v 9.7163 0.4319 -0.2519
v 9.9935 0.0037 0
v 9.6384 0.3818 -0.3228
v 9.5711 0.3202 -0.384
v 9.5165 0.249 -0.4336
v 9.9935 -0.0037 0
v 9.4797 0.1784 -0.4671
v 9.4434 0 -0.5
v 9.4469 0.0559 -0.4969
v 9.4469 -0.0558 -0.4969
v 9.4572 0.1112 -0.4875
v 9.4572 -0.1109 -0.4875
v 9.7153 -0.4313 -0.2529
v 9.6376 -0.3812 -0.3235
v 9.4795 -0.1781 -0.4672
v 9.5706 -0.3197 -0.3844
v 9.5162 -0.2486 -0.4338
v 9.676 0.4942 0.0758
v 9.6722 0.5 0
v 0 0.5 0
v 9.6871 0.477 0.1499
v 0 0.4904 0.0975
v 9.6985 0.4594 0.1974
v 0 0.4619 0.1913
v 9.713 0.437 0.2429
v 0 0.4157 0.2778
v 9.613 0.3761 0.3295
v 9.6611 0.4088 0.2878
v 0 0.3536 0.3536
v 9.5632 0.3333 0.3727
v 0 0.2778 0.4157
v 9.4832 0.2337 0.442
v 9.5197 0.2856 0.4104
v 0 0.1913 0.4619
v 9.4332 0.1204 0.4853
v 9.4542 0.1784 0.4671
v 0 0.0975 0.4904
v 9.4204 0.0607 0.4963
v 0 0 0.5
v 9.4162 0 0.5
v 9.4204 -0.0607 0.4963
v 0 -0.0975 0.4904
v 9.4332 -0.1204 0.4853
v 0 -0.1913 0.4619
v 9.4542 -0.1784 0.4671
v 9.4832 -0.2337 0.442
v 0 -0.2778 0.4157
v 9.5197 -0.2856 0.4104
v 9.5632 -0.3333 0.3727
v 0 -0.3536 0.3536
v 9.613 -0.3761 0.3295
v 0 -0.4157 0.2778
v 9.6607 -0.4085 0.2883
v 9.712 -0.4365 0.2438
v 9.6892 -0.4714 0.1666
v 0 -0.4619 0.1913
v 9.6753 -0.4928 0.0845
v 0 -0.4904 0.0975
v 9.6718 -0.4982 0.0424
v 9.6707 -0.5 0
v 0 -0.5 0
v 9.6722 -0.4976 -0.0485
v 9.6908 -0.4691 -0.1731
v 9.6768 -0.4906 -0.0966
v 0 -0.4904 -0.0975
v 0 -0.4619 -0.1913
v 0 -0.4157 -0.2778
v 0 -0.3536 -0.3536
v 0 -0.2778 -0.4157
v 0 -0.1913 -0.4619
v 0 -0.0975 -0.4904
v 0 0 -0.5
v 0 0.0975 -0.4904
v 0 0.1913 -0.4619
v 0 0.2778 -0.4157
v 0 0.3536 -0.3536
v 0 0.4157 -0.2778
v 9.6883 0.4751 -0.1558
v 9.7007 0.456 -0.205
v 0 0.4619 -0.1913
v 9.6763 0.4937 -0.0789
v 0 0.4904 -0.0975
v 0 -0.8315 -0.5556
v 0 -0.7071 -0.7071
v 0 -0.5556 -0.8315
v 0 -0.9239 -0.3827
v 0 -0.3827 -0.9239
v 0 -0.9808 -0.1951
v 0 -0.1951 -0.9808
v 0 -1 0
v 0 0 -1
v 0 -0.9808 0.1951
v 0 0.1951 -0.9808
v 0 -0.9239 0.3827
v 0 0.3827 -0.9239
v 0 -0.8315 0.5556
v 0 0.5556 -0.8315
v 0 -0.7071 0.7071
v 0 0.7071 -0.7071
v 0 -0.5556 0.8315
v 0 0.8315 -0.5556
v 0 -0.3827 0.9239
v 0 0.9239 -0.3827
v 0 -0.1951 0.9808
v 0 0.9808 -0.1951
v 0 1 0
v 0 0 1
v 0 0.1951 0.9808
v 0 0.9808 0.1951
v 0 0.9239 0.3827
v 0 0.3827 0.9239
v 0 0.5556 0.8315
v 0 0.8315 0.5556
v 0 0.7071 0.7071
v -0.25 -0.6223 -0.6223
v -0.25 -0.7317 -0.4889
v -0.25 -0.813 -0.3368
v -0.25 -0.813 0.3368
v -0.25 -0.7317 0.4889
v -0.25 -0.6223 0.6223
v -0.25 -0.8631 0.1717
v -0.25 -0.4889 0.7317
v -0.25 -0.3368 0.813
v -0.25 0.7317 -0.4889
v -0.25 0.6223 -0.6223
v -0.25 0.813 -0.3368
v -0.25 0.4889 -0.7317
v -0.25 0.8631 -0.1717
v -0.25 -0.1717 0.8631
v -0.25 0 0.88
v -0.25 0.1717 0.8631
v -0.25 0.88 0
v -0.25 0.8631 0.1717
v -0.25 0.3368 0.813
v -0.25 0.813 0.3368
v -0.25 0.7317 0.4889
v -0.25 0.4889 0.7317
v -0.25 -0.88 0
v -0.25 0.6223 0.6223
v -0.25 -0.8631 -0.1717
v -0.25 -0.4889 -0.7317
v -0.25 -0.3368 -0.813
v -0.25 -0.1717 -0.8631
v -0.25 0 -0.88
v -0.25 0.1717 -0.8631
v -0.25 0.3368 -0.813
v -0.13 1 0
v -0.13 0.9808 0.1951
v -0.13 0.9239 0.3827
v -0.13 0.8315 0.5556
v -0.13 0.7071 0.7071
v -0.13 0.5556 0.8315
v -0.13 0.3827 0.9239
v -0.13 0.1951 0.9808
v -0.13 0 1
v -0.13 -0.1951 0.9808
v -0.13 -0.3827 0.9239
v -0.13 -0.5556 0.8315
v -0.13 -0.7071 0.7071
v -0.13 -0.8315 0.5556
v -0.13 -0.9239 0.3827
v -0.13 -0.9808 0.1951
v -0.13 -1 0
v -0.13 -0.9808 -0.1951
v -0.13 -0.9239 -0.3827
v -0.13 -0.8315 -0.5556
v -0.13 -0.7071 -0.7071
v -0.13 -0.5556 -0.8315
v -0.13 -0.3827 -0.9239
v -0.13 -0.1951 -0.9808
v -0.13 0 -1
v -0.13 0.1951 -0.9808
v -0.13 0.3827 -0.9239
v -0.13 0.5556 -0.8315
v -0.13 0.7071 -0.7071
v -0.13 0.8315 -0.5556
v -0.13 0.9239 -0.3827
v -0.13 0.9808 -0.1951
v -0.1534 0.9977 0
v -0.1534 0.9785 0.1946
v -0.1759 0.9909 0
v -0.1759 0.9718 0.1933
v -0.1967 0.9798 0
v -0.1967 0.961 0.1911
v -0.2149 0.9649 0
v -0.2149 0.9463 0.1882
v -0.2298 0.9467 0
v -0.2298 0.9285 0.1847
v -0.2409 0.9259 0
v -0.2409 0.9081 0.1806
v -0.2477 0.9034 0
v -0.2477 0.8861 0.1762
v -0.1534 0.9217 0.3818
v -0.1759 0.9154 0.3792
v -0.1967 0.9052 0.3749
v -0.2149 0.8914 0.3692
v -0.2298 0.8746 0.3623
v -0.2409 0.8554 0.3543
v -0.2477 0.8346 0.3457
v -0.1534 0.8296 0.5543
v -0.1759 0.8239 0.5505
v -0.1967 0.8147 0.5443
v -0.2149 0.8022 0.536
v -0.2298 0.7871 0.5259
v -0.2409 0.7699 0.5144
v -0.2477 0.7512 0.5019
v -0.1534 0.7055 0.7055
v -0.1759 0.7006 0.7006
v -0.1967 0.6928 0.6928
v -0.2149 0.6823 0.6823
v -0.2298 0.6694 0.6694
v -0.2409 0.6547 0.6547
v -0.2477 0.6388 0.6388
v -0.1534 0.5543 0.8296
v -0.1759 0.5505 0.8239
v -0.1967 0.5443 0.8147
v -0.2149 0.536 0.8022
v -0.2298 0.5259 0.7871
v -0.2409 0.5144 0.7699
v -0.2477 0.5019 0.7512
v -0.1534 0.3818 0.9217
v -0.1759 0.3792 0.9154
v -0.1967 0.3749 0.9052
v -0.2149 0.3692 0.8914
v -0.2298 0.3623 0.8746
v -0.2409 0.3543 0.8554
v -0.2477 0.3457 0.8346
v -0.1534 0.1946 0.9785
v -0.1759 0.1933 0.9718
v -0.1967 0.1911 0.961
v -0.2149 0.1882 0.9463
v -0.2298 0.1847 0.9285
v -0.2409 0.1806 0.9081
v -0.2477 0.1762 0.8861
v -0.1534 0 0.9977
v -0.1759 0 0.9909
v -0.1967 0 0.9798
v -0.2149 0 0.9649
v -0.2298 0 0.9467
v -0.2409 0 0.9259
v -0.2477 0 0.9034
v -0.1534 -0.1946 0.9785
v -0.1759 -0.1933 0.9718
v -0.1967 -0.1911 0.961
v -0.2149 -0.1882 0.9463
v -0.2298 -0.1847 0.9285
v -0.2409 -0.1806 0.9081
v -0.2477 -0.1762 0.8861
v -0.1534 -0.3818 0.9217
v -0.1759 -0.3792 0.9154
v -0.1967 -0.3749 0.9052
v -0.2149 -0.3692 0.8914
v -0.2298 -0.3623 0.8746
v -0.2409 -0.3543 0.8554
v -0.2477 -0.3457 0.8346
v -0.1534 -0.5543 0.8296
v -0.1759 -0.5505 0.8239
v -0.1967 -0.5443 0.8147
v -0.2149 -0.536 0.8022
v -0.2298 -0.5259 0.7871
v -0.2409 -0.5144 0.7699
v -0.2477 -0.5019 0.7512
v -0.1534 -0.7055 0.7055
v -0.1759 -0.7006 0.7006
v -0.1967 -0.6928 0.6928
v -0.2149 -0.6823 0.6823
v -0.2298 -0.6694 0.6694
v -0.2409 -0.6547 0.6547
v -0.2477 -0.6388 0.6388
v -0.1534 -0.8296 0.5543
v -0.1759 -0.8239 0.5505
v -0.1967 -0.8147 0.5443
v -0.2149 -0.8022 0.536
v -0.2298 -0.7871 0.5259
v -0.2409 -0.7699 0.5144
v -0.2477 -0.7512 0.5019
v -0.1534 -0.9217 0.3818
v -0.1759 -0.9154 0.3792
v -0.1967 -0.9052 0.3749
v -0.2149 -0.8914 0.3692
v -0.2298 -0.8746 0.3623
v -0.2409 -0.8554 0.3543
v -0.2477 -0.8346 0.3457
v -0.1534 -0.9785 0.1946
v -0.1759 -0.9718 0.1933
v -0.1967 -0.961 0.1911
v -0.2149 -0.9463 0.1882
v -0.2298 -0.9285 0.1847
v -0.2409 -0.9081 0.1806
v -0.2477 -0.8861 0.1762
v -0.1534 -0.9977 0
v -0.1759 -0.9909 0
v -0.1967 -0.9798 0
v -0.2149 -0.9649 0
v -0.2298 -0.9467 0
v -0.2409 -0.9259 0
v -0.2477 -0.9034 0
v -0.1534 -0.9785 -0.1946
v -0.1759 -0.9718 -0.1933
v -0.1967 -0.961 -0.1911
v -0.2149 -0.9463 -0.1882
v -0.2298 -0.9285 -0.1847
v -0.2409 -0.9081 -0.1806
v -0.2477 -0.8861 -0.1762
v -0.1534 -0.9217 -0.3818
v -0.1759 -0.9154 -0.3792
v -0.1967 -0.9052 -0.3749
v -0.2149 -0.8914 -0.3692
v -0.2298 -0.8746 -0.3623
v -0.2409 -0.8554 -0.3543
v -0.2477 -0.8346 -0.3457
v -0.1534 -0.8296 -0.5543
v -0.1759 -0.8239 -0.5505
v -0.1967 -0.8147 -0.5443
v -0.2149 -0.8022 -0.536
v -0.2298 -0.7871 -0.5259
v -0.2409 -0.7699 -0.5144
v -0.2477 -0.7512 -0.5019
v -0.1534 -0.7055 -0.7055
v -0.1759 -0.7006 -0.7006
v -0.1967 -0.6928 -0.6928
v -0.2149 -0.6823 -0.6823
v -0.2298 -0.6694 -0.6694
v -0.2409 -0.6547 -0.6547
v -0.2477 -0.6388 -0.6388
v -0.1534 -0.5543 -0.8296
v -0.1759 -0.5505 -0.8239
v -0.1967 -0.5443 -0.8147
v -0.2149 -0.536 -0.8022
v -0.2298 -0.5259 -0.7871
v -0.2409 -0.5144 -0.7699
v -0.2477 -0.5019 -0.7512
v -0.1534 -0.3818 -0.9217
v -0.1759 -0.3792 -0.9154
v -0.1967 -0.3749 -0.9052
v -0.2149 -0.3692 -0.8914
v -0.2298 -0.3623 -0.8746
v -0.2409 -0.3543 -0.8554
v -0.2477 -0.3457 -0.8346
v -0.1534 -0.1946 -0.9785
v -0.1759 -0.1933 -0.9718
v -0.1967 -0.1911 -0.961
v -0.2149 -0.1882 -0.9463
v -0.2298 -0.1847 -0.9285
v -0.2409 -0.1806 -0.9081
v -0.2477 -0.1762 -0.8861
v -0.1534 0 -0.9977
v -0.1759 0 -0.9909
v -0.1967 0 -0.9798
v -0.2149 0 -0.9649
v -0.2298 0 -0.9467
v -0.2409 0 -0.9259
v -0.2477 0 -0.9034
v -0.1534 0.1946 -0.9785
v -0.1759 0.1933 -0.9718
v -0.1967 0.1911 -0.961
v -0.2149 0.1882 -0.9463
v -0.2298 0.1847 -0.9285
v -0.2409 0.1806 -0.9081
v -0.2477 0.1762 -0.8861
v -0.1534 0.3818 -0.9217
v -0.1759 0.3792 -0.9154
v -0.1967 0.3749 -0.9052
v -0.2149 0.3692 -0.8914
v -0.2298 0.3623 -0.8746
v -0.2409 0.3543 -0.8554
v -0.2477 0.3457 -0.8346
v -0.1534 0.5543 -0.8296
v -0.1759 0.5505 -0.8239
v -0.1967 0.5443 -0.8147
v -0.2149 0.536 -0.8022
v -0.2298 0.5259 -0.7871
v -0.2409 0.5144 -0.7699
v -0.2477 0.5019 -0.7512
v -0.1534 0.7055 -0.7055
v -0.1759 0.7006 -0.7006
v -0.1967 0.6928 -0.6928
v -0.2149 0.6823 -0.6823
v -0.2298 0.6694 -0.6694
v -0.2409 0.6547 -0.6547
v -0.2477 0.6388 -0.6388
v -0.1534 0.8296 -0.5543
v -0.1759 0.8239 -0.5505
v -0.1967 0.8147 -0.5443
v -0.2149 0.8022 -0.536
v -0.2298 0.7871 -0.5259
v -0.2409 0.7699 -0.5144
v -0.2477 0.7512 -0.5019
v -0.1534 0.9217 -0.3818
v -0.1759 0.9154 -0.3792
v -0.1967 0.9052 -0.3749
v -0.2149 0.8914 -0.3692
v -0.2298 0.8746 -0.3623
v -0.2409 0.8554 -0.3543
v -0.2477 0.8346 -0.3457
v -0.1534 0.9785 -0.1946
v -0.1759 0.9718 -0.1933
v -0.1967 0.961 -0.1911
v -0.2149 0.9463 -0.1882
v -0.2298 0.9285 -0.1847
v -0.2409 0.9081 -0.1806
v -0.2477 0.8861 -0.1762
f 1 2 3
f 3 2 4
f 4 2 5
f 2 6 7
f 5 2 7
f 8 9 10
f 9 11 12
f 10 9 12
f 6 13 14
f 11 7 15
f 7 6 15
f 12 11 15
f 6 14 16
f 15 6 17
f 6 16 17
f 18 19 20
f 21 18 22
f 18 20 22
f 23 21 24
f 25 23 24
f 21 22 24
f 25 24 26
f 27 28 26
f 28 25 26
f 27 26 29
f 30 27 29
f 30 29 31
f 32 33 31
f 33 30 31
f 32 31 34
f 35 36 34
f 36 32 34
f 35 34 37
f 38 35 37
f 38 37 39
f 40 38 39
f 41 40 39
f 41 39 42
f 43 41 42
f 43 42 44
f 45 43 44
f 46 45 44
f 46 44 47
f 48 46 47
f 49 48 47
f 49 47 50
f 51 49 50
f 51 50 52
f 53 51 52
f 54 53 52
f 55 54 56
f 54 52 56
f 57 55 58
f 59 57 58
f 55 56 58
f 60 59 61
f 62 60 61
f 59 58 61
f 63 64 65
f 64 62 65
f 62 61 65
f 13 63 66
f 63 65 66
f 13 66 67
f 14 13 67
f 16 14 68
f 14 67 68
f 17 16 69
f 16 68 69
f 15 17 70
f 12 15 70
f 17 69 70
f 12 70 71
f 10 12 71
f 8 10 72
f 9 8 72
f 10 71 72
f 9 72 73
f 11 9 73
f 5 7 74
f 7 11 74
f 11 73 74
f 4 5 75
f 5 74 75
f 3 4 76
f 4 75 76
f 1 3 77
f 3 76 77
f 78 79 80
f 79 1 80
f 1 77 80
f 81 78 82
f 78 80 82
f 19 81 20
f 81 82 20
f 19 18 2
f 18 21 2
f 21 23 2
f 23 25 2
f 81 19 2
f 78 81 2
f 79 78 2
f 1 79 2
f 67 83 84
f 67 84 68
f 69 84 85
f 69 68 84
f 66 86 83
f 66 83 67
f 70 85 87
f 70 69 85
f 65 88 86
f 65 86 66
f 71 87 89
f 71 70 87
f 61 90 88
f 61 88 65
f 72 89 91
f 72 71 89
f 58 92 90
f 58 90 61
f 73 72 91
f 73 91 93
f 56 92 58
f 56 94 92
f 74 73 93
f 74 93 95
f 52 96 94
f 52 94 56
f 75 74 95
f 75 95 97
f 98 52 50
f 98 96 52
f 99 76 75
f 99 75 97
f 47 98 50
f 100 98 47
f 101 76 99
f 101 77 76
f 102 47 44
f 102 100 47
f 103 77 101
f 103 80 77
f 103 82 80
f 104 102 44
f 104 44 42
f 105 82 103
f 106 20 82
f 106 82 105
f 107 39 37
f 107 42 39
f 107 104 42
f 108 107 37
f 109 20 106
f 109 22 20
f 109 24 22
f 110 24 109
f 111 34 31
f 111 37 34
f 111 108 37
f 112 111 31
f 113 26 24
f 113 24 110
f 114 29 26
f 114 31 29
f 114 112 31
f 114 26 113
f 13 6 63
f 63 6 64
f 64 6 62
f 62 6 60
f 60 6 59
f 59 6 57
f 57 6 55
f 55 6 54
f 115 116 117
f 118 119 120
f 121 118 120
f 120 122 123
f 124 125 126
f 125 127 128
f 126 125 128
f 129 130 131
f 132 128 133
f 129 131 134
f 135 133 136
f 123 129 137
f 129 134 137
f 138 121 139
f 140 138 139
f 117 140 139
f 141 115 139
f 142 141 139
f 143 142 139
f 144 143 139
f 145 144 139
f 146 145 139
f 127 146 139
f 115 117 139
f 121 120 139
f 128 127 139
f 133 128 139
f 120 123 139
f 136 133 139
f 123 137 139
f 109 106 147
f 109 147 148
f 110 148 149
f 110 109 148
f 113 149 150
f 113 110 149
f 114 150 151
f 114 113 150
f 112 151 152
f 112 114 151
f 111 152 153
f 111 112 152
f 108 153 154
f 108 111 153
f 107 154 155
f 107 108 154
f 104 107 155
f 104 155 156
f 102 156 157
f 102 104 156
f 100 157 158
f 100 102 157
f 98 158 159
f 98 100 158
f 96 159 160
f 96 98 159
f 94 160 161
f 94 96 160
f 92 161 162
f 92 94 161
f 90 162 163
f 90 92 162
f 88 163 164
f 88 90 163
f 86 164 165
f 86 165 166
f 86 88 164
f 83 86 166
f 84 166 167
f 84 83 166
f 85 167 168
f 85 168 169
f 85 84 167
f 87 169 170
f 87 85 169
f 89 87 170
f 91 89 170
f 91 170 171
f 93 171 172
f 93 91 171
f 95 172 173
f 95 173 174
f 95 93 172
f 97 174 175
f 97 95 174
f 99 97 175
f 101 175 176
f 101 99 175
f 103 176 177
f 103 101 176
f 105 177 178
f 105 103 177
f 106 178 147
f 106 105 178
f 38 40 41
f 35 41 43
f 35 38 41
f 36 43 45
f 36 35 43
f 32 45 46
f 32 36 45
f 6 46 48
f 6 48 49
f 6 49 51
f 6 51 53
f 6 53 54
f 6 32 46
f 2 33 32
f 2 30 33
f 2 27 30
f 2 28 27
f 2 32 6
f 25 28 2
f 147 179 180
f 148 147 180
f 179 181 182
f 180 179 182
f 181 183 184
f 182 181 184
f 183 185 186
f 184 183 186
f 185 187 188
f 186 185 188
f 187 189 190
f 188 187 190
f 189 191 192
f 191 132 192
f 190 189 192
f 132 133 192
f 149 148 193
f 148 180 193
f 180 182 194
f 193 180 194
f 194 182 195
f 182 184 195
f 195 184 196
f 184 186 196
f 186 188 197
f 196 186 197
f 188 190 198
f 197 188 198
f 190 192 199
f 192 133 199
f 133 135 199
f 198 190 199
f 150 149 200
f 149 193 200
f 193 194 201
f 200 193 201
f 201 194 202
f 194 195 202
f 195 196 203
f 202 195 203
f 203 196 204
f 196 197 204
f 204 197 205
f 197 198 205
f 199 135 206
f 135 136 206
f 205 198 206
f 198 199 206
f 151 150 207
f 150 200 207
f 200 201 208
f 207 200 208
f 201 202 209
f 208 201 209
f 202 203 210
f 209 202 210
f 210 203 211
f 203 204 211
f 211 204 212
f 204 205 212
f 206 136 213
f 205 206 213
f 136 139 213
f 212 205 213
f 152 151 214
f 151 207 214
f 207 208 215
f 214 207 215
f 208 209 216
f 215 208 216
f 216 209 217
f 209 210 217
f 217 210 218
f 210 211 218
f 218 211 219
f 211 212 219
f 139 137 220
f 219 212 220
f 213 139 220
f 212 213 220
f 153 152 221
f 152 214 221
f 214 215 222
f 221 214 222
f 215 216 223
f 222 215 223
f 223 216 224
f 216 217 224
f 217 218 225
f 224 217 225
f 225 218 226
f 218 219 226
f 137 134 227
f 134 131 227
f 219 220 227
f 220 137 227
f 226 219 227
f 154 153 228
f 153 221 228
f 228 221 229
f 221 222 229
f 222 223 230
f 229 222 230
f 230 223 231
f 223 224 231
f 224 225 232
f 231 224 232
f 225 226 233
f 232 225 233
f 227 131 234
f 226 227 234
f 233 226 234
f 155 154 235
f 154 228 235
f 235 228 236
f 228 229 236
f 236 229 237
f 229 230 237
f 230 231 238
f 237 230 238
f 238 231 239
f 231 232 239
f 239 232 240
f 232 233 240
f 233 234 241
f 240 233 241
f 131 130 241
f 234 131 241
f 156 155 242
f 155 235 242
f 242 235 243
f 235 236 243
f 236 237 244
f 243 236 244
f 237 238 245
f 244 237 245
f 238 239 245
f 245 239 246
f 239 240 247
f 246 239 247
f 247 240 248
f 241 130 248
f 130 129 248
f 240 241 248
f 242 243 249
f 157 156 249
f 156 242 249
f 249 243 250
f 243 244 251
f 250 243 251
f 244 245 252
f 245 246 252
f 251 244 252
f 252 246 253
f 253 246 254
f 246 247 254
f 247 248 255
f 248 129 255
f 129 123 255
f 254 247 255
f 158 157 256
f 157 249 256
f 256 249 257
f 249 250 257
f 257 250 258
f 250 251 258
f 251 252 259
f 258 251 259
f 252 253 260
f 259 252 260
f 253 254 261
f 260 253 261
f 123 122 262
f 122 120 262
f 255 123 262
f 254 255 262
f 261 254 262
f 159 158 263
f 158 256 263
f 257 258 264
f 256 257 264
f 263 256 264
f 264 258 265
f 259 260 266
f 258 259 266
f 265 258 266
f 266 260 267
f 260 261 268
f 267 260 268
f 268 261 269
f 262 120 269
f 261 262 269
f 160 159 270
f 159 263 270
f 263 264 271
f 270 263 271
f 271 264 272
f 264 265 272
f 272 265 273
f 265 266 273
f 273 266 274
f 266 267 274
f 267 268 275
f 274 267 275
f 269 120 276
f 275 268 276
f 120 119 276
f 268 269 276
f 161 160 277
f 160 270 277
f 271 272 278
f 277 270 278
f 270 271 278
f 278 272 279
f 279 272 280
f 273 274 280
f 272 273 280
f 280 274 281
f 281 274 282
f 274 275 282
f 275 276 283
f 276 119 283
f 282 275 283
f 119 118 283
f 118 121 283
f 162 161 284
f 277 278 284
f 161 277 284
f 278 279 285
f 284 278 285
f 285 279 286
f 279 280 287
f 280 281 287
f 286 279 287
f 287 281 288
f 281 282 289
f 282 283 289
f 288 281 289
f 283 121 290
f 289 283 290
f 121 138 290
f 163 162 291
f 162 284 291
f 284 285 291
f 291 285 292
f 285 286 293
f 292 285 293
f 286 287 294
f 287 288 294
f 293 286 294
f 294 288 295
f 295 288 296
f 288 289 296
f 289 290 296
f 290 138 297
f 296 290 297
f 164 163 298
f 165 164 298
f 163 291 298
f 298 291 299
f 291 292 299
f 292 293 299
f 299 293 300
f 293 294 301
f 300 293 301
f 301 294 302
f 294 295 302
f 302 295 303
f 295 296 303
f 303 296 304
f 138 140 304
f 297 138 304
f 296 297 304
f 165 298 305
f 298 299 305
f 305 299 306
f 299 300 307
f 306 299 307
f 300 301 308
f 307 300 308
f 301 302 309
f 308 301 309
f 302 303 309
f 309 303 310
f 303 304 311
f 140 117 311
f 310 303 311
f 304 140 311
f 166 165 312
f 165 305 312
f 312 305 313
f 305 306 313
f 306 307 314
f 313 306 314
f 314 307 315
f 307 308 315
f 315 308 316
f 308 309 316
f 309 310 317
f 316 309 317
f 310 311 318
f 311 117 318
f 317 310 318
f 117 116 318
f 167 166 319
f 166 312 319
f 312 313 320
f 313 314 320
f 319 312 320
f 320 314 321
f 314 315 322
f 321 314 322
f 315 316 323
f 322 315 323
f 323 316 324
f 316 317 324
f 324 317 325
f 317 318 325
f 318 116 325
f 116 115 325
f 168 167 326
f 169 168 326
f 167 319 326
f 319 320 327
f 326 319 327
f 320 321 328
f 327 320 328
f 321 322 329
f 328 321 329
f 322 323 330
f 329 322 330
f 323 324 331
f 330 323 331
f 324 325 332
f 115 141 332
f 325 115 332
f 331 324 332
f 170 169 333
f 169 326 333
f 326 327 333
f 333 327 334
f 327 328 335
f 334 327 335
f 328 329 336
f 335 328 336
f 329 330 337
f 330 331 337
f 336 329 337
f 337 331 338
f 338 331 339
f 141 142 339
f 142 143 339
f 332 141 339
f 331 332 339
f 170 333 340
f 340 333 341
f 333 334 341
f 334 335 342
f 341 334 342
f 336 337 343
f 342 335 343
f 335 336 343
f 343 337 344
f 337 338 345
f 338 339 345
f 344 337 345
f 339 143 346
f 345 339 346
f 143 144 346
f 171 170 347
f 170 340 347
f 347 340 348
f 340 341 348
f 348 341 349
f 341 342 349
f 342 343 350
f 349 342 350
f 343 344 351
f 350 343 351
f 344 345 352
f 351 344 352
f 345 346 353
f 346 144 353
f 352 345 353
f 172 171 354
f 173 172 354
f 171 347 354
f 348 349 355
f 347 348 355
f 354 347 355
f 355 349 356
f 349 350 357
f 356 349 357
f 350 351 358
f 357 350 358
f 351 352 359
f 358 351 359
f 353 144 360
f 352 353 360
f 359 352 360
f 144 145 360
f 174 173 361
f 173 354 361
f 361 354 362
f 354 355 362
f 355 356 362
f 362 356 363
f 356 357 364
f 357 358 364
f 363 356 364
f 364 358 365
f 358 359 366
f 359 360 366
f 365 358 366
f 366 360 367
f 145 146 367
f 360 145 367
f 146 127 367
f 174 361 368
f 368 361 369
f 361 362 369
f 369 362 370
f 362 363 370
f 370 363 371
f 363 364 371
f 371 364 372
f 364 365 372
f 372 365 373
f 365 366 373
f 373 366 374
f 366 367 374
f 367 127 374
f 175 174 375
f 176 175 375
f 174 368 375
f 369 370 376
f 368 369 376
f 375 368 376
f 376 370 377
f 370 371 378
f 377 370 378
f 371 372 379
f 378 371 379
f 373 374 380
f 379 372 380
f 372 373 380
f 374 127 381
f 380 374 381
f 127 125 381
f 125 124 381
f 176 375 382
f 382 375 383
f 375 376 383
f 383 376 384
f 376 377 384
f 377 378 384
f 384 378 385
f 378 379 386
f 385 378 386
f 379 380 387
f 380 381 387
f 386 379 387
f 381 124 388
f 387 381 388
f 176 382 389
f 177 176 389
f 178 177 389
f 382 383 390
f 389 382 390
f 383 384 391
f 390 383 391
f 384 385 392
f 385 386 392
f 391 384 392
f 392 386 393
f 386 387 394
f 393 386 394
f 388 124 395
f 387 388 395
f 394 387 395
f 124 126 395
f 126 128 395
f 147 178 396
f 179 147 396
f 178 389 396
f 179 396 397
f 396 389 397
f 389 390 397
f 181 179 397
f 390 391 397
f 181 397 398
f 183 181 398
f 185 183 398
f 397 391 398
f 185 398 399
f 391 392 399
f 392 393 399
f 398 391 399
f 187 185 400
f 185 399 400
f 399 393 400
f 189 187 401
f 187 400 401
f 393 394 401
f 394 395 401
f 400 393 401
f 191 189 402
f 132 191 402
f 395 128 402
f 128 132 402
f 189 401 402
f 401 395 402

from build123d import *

# Parameters (mm, degrees)
F0_R          = 0.5
F1_DEPTH      = 10
F0_R_2        = 1
F2_DEPTH      = 0.25
F3_R          = 0.12
F5_DEPTH      = 5
F5_DEPTH_BACK = 5
F7_DEPTH      = 25
F7_DEPTH_BACK = 25


with BuildPart() as f1:
    # F0 (on Right) → F1 (new body)
    with BuildSketch(Plane.YZ):
        Circle(F0_R)
    extrude(amount=F1_DEPTH)

    # F0 (on Right) → F2 (join)
    with BuildSketch(Plane.YZ):
        Circle(F0_R_2)
        Circle(F0_R, mode=Mode.SUBTRACT)
        Circle(F0_R)
    extrude(amount=-F2_DEPTH)

    # F3
    f3_edges = [f1.edges().sort_by_distance(p)[0] for p in [
        (-0.25, -1, 0),
    ]]
    fillet(f3_edges, radius=F3_R)

    # F4 (on Front) → F5 (cut, two sides)
    with BuildSketch(Plane.XZ) as f5_sk:
        Polygon((8.994769305, 0.8649917436), (9.9934805185, 0), (9.1212727129, -0.79286861), (10.6126805767, -1.0325592011), (10.7525009662, 0.9182563517), align=None)
    extrude(amount=F5_DEPTH, mode=Mode.SUBTRACT)
    extrude(f5_sk.sketch, amount=-F5_DEPTH_BACK, mode=Mode.SUBTRACT)

    # F6 (on Top) → F7 (cut, two sides)
    with BuildSketch(Plane.XY) as f7_sk:
        Polygon((10.3356074542, 0.6147447275), (9.5979655161, 0.6147447275), (9.9958730862, 0), (9.5723690465, -0.6511143292), (10.3356074542, -0.6511143292), align=None)
    extrude(amount=F7_DEPTH, mode=Mode.SUBTRACT)
    extrude(f7_sk.sketch, amount=-F7_DEPTH_BACK, mode=Mode.SUBTRACT)


solid = f1.part
